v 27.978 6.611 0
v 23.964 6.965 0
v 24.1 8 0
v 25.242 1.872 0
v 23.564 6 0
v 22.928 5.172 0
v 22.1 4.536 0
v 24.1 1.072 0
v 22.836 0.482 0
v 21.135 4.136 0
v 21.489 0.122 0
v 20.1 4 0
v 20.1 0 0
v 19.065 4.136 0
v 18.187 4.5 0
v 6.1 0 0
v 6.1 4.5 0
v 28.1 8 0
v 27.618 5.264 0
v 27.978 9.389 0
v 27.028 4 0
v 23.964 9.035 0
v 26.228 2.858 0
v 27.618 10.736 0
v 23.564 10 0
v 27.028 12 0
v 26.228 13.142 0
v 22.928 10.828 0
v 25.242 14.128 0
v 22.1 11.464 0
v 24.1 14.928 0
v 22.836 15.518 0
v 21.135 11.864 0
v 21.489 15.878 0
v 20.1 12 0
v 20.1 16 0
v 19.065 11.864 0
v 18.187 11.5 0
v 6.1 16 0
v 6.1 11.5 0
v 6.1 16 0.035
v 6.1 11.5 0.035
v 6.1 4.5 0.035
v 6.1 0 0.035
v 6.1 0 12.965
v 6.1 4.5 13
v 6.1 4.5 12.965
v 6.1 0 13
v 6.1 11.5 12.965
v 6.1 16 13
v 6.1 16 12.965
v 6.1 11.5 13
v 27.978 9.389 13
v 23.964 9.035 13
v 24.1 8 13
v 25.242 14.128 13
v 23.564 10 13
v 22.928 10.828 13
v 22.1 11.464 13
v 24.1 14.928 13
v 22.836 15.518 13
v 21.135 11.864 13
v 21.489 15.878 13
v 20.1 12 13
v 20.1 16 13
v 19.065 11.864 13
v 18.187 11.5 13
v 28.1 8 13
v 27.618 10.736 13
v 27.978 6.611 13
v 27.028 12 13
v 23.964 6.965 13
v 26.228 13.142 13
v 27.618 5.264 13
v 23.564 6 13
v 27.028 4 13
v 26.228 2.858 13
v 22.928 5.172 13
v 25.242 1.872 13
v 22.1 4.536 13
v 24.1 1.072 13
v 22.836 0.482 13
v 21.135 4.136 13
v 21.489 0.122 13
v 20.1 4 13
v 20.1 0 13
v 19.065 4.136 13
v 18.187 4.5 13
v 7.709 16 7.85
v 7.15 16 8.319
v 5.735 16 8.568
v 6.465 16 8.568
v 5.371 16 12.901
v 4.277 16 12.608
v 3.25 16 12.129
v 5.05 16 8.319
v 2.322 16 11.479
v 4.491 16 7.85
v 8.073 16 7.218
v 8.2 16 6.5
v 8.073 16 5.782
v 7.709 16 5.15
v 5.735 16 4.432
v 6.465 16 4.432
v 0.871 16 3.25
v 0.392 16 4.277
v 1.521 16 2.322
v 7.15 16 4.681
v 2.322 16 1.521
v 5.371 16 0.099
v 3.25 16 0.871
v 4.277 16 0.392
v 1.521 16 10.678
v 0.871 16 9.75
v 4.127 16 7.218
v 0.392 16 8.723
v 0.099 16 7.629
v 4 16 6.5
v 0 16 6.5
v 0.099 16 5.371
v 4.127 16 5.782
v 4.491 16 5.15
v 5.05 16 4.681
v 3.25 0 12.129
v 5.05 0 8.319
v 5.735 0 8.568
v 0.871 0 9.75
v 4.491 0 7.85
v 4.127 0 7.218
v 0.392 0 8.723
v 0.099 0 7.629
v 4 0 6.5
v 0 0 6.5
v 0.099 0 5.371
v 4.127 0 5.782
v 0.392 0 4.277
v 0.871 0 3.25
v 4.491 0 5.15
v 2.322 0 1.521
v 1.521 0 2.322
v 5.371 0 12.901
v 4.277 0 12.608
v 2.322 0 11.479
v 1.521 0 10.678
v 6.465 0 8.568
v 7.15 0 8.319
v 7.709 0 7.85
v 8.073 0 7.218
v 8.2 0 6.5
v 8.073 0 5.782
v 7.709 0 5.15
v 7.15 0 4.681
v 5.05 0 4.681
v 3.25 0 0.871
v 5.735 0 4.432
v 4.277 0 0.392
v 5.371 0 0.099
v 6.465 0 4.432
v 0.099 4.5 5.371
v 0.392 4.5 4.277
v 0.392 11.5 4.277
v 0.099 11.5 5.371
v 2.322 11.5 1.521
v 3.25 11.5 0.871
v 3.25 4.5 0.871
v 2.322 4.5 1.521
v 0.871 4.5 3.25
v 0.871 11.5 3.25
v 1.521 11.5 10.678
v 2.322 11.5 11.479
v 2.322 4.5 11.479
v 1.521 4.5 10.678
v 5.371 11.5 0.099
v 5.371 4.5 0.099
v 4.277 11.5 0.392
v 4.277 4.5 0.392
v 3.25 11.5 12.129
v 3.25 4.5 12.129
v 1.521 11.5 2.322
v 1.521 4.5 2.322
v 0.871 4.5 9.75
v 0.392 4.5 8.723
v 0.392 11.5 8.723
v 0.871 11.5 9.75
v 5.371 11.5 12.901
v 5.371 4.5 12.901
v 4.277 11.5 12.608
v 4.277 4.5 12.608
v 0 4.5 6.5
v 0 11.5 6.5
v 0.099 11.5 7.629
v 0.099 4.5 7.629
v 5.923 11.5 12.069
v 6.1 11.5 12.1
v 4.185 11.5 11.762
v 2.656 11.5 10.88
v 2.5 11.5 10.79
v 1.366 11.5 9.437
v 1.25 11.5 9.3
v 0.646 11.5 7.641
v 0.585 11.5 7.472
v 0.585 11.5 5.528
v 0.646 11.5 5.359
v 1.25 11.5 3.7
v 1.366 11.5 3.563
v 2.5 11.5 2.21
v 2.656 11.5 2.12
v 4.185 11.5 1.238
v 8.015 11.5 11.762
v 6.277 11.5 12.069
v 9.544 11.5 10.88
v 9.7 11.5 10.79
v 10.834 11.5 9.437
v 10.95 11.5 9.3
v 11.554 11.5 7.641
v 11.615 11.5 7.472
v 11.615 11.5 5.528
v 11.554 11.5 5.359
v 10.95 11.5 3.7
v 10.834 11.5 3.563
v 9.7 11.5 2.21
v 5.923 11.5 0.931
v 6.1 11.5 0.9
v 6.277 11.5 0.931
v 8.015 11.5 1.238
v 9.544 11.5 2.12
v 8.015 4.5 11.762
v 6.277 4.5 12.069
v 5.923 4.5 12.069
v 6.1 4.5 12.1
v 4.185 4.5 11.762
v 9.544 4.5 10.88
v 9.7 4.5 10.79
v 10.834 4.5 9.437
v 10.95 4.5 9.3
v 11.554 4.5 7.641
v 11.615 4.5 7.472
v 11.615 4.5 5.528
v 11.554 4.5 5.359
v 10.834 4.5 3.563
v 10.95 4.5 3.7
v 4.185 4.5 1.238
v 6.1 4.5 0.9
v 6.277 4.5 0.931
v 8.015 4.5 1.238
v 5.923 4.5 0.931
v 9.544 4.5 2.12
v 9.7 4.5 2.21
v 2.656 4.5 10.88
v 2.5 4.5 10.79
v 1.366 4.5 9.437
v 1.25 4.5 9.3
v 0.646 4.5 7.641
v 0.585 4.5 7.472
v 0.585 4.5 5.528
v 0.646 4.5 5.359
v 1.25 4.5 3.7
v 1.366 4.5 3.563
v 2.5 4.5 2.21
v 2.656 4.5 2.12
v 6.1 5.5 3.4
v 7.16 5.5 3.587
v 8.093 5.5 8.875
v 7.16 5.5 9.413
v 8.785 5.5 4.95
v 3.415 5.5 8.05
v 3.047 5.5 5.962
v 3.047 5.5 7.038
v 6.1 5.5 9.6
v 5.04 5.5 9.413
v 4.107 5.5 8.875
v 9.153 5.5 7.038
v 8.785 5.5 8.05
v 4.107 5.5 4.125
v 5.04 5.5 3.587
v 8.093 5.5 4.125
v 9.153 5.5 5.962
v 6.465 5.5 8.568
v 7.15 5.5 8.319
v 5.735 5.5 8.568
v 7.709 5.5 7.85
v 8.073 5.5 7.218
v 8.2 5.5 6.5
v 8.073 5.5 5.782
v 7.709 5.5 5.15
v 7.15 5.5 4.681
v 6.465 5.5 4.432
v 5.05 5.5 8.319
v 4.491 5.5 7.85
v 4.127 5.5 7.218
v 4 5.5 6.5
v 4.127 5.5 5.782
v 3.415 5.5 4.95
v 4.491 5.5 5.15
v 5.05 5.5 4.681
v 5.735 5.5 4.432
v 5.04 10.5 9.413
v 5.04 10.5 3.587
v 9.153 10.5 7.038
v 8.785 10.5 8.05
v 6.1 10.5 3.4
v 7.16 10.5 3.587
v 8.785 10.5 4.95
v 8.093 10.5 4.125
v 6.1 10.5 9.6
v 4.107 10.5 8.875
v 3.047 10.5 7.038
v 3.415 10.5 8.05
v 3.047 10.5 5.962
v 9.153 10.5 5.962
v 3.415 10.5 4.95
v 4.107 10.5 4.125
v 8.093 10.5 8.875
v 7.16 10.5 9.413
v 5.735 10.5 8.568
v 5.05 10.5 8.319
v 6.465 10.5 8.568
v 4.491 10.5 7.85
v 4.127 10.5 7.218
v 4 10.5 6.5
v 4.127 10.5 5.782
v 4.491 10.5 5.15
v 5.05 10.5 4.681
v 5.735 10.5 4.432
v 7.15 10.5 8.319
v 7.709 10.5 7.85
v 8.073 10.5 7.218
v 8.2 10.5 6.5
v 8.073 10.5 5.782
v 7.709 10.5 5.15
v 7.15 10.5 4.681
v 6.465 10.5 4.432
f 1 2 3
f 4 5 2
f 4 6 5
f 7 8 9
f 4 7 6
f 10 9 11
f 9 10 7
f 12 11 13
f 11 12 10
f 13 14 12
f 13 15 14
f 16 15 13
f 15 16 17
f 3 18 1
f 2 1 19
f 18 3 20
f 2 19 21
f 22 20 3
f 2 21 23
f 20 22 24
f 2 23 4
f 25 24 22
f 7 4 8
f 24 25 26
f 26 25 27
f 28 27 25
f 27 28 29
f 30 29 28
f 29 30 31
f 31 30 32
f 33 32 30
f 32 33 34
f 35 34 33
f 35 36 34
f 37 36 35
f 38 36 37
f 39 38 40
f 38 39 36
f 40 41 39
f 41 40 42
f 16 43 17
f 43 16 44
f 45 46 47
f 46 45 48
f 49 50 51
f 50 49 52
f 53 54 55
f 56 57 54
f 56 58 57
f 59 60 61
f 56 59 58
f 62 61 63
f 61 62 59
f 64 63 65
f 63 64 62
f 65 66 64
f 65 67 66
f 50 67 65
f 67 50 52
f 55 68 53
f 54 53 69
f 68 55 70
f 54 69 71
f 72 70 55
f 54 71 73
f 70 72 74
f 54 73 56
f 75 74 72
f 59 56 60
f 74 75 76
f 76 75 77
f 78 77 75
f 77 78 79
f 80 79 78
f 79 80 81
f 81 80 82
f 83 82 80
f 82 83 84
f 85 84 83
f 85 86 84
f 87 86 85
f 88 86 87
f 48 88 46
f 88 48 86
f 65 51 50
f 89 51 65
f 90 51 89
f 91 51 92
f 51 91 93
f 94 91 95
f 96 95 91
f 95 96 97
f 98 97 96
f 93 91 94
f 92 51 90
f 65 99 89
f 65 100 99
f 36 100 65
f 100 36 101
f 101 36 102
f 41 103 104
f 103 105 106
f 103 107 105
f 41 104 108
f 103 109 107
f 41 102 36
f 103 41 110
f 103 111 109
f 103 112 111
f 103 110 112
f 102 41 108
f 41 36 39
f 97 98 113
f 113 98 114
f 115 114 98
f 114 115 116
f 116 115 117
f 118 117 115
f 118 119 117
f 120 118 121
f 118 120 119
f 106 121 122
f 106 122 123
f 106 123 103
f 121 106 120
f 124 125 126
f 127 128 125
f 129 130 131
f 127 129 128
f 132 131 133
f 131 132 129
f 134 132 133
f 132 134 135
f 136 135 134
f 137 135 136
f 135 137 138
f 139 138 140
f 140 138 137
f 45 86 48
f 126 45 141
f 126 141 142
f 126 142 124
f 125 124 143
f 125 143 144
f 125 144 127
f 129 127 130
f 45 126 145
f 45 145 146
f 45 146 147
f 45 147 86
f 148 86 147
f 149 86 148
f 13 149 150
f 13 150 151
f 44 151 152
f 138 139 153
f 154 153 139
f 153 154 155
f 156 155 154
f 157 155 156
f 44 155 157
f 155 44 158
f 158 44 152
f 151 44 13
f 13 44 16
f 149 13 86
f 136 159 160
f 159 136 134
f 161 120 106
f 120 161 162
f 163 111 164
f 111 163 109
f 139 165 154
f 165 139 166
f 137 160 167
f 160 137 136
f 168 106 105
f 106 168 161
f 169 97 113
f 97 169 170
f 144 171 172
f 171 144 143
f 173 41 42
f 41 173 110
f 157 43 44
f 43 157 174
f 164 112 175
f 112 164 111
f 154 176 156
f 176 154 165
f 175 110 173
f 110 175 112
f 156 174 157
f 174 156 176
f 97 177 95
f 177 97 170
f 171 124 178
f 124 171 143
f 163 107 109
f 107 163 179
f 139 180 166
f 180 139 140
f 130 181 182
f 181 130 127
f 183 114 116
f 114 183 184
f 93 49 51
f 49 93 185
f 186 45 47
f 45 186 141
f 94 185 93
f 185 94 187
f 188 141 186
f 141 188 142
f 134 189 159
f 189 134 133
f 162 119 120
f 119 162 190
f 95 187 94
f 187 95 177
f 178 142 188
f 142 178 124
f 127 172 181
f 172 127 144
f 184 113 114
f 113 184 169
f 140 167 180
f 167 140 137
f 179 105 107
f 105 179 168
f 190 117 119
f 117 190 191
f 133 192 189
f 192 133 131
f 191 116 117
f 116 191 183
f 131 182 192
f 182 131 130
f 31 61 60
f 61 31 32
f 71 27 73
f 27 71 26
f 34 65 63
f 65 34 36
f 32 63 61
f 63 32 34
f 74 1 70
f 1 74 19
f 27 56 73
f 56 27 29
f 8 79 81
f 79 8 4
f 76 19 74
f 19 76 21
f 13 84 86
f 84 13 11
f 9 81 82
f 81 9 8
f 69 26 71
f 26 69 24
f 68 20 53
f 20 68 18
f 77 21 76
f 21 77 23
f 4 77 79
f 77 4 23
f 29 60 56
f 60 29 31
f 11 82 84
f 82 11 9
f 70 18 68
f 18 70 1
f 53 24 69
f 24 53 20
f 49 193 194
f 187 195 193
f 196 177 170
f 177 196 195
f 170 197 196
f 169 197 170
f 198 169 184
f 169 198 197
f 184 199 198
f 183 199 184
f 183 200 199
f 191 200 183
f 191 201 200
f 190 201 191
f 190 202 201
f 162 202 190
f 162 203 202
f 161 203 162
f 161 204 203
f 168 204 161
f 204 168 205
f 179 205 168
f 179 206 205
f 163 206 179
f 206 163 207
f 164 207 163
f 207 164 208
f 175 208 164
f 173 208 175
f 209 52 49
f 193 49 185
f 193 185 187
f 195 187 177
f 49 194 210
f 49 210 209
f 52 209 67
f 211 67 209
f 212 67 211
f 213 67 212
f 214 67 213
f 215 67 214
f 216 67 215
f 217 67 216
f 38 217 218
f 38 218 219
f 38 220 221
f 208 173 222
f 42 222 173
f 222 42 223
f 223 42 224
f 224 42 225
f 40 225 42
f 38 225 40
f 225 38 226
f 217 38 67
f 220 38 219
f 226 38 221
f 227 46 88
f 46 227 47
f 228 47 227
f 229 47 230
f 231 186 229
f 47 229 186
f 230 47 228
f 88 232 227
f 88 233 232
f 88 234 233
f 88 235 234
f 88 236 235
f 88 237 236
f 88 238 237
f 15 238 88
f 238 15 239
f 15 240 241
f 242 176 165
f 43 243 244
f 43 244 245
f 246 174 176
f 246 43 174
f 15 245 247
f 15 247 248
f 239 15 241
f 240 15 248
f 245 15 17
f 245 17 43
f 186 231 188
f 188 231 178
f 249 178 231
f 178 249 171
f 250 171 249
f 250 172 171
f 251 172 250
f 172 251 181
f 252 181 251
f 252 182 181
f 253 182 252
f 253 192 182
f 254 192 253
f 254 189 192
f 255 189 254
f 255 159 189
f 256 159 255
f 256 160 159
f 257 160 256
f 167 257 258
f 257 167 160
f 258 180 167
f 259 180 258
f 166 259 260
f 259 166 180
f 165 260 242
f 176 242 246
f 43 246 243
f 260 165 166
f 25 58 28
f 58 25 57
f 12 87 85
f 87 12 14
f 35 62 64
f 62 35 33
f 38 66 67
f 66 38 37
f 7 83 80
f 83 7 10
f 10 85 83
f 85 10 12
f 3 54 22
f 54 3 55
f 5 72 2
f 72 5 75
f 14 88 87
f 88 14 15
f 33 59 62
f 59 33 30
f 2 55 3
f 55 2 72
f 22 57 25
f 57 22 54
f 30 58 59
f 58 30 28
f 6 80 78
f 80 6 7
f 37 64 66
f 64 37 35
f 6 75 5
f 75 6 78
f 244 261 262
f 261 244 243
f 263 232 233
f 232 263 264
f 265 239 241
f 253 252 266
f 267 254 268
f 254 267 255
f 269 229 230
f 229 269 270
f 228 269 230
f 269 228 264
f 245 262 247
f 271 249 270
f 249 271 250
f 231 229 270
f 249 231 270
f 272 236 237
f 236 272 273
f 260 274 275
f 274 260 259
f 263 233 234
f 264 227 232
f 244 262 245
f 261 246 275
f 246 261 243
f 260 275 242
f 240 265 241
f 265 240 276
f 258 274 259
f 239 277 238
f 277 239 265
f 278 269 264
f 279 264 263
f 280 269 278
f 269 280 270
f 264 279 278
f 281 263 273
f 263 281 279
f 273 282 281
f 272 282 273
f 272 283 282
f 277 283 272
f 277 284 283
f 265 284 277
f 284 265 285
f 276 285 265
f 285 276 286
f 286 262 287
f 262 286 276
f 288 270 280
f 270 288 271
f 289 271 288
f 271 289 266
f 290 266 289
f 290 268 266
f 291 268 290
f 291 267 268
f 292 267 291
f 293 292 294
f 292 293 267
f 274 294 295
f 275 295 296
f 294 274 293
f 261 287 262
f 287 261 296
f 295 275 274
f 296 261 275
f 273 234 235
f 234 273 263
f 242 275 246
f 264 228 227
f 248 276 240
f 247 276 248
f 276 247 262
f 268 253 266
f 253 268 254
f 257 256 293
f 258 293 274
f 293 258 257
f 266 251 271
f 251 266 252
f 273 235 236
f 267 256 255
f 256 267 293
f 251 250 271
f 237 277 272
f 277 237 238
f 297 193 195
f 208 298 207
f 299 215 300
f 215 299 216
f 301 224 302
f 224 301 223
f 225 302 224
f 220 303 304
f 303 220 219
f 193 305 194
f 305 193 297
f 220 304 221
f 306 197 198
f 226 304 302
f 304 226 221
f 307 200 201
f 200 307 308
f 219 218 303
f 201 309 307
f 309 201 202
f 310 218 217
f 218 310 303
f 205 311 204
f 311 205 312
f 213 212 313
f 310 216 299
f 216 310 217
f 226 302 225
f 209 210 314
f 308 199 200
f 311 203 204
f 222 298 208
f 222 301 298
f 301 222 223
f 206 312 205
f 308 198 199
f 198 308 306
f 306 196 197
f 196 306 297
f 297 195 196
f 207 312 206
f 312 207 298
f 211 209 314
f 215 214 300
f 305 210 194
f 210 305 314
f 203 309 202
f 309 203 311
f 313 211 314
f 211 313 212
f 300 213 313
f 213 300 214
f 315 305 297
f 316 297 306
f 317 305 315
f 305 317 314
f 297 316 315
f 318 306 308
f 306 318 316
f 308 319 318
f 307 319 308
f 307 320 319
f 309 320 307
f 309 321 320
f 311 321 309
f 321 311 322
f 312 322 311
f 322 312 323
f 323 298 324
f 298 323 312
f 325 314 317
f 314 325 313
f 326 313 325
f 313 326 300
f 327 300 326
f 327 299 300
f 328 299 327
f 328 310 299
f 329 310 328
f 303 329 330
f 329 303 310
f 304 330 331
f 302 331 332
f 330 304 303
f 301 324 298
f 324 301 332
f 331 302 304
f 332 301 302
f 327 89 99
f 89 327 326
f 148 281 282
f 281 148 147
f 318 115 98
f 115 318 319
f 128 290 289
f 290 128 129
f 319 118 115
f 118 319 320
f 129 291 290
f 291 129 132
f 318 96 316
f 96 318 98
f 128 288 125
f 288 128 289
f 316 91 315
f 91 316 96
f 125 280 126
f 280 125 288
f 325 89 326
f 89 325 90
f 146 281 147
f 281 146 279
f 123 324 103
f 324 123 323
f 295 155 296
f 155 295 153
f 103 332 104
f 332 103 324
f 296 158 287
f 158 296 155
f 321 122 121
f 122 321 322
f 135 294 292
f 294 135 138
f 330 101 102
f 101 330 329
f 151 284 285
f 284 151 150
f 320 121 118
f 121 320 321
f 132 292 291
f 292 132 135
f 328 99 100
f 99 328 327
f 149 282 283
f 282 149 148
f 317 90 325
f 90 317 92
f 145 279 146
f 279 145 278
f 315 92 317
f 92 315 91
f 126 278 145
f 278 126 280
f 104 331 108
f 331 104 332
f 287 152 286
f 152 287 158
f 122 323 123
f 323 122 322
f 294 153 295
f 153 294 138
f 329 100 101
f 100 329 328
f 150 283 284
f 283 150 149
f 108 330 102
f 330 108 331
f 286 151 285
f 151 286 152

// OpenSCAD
//
// prusa-i3-belt-tensioner.scad
//
// This simple belt tensioner part mounts on the top x-axis
// smooth rod and holds a 624 bearing with a 4mm screw. The
// belt goes over the bearing and the tension is adjusted by
// a screw on the top of the rod.
//
// The inner walls are meant to grip the x-axis rod to
// prevent the tensioner from sliding left in response
// to vibration. If you need to improve the grip try placing
// a wide piece of rubber band between the rod and the
// tensioner, or reprint the piece with a higher mount_tightness
// value.
//
// Once you find an ideal tension, print a new part with
// rod_top_to_screw at the new distance for an idealized
// tensioner. It's a small part so why not?
//

// basic presets
$fn = 15;
radius_3mm = 1.55;
radius_4mm = 2.1;

// How deep to make the nut trap
nut_height_3mm = 2.5 + 1.75;

// The diameter of the x-axis rod. Usually 8mm or 10mm.
rod_diameter = 8;
rod_radius = rod_diameter / 2;

// Thickness of the part walls. 3 or 4mm is springy
// higher values give more rigid front and rear walls
part_thickness = 4;

// Include a hole in the top for a tensioner
// Turn this off if printing a part at full tension
tension_is_adjustable = false;

// amount of space to remove around the rod so it fits tighter
mount_tightness = tension_is_adjustable ? 0.5 : 1.0;

// added ridges are mainly cosmetic, grip will be variable
mount_ridges = tension_is_adjustable ? 3 : 0;

// Distance from the top of the rod to the center of the bearing.
// The existing bearing distance is the no tension position.
rod_top_to_screw = tension_is_adjustable ? 28 : 18;

// Extra height added to the solid top of the part
extra_height = 0;

// The size of the 624 or other bearing
bearing_diameter = 13;
bearing_depth = 5;
bearing_hole_radius = radius_4mm;

//
// Derived values
//

bearing_radius = bearing_diameter / 2;

mt2 = mount_tightness / 2;

// Inner holders for the bearing keep it centered
holder_depth = (rod_diameter - bearing_depth - mount_tightness) / 2;

// calc the x_rod_top from the y position of the bearing screw hole
x_rod_top = part_thickness + bearing_hole_radius + rod_top_to_screw;

// center of the x rod
x_rod_ypos = x_rod_top - rod_radius;

// Position of the tensioner screw hole
tensioner_ypos = x_rod_top + (part_thickness + extra_height) / 2;

module x_rod() {
	translate([0, part_thickness + rod_radius, x_rod_ypos])
		color([0.9, 0.9, 0.9, 0.2])
			rotate([0, 90, 0])
				cylinder(r=4, h=100, center=true);
}

module belt_tensioner_x() {

//	x_rod();

	difference() {
		union() {
			difference() {
				// Main tensioner body
				color([0.8, 0.8, 1])
				union() {
					translate([0, 0, part_thickness + bearing_hole_radius])
						cube([bearing_diameter, rod_diameter + part_thickness * 2, part_thickness + bearing_hole_radius + rod_top_to_screw - rod_radius - (part_thickness + bearing_hole_radius) + extra_height]);
					translate([bearing_radius, rod_radius + part_thickness, bearing_radius])
						rotate([90, 0, 0])
							cylinder(r=bearing_radius, h=rod_diameter + part_thickness * 2, center=true, $fn=36);
					translate([bearing_radius, rod_radius + part_thickness, x_rod_ypos + extra_height])
						rotate([0, 90, 0])
							cylinder(r=part_thickness + rod_radius, h=bearing_diameter, center=true, $fn=36);
				}

				// Negative square part
				color([1, 1, 1])
					translate([-1, part_thickness + mt2, -1])
						cube([bearing_diameter + 2, rod_diameter - mount_tightness, x_rod_ypos + 1]);

				// The rounded part with optional ridges
				color([1, 1, 1])
					for(z=[0:mount_ridges])
						translate([bearing_radius, part_thickness + rod_radius, x_rod_ypos - rod_radius * z])
							rotate([0, 90, 0])
								cylinder(r=4, h=bearing_diameter + 2, center=true, $fn=24);

			}

			// Bearing holders
			color([0.2, 0.8, 0.2, 1])
			for(y=[0, rod_diameter - holder_depth])
				translate([bearing_radius, y + part_thickness + holder_depth / 2 + (y == 0 ? mt2 - 0.1 : -mt2 + 0.1), part_thickness + bearing_hole_radius])
					rotate([90, 0])
						cylinder(r1=(y == 0 ? bearing_hole_radius + 1 : bearing_hole_radius + part_thickness), r2=(y == 0 ? bearing_hole_radius + part_thickness : bearing_hole_radius + 1), h=holder_depth + 0.2, center=true, $fn=18);
		}

		// Bearing Screw Hole
		translate([bearing_radius, -1, part_thickness + bearing_hole_radius])
			rotate([0, 90, 90])
				cylinder(r=bearing_hole_radius, h=part_thickness * 2 + rod_diameter + 2, $fn=18);

		if (tension_is_adjustable) {
			// Tensioner screw hole
			translate([bearing_radius, part_thickness + rod_radius, tensioner_ypos])
				cylinder(r=radius_3mm, h=part_thickness + extra_height + 1, center=true);

			// Nut Trap
			translate([bearing_radius, part_thickness + rod_radius, x_rod_top + 0.1])
				cylinder(r=radius_3mm + 1.6, h=nut_height_3mm, center=true, $fn=6);
		}
	}
}

translate([0, 0, bearing_diameter]) rotate([0, 90]) belt_tensioner_x();

// Ruler
// translate([0,0,part_thickness + bearing_hole_radius]) color([0,0,0]) cube([10, 10, 28]);
